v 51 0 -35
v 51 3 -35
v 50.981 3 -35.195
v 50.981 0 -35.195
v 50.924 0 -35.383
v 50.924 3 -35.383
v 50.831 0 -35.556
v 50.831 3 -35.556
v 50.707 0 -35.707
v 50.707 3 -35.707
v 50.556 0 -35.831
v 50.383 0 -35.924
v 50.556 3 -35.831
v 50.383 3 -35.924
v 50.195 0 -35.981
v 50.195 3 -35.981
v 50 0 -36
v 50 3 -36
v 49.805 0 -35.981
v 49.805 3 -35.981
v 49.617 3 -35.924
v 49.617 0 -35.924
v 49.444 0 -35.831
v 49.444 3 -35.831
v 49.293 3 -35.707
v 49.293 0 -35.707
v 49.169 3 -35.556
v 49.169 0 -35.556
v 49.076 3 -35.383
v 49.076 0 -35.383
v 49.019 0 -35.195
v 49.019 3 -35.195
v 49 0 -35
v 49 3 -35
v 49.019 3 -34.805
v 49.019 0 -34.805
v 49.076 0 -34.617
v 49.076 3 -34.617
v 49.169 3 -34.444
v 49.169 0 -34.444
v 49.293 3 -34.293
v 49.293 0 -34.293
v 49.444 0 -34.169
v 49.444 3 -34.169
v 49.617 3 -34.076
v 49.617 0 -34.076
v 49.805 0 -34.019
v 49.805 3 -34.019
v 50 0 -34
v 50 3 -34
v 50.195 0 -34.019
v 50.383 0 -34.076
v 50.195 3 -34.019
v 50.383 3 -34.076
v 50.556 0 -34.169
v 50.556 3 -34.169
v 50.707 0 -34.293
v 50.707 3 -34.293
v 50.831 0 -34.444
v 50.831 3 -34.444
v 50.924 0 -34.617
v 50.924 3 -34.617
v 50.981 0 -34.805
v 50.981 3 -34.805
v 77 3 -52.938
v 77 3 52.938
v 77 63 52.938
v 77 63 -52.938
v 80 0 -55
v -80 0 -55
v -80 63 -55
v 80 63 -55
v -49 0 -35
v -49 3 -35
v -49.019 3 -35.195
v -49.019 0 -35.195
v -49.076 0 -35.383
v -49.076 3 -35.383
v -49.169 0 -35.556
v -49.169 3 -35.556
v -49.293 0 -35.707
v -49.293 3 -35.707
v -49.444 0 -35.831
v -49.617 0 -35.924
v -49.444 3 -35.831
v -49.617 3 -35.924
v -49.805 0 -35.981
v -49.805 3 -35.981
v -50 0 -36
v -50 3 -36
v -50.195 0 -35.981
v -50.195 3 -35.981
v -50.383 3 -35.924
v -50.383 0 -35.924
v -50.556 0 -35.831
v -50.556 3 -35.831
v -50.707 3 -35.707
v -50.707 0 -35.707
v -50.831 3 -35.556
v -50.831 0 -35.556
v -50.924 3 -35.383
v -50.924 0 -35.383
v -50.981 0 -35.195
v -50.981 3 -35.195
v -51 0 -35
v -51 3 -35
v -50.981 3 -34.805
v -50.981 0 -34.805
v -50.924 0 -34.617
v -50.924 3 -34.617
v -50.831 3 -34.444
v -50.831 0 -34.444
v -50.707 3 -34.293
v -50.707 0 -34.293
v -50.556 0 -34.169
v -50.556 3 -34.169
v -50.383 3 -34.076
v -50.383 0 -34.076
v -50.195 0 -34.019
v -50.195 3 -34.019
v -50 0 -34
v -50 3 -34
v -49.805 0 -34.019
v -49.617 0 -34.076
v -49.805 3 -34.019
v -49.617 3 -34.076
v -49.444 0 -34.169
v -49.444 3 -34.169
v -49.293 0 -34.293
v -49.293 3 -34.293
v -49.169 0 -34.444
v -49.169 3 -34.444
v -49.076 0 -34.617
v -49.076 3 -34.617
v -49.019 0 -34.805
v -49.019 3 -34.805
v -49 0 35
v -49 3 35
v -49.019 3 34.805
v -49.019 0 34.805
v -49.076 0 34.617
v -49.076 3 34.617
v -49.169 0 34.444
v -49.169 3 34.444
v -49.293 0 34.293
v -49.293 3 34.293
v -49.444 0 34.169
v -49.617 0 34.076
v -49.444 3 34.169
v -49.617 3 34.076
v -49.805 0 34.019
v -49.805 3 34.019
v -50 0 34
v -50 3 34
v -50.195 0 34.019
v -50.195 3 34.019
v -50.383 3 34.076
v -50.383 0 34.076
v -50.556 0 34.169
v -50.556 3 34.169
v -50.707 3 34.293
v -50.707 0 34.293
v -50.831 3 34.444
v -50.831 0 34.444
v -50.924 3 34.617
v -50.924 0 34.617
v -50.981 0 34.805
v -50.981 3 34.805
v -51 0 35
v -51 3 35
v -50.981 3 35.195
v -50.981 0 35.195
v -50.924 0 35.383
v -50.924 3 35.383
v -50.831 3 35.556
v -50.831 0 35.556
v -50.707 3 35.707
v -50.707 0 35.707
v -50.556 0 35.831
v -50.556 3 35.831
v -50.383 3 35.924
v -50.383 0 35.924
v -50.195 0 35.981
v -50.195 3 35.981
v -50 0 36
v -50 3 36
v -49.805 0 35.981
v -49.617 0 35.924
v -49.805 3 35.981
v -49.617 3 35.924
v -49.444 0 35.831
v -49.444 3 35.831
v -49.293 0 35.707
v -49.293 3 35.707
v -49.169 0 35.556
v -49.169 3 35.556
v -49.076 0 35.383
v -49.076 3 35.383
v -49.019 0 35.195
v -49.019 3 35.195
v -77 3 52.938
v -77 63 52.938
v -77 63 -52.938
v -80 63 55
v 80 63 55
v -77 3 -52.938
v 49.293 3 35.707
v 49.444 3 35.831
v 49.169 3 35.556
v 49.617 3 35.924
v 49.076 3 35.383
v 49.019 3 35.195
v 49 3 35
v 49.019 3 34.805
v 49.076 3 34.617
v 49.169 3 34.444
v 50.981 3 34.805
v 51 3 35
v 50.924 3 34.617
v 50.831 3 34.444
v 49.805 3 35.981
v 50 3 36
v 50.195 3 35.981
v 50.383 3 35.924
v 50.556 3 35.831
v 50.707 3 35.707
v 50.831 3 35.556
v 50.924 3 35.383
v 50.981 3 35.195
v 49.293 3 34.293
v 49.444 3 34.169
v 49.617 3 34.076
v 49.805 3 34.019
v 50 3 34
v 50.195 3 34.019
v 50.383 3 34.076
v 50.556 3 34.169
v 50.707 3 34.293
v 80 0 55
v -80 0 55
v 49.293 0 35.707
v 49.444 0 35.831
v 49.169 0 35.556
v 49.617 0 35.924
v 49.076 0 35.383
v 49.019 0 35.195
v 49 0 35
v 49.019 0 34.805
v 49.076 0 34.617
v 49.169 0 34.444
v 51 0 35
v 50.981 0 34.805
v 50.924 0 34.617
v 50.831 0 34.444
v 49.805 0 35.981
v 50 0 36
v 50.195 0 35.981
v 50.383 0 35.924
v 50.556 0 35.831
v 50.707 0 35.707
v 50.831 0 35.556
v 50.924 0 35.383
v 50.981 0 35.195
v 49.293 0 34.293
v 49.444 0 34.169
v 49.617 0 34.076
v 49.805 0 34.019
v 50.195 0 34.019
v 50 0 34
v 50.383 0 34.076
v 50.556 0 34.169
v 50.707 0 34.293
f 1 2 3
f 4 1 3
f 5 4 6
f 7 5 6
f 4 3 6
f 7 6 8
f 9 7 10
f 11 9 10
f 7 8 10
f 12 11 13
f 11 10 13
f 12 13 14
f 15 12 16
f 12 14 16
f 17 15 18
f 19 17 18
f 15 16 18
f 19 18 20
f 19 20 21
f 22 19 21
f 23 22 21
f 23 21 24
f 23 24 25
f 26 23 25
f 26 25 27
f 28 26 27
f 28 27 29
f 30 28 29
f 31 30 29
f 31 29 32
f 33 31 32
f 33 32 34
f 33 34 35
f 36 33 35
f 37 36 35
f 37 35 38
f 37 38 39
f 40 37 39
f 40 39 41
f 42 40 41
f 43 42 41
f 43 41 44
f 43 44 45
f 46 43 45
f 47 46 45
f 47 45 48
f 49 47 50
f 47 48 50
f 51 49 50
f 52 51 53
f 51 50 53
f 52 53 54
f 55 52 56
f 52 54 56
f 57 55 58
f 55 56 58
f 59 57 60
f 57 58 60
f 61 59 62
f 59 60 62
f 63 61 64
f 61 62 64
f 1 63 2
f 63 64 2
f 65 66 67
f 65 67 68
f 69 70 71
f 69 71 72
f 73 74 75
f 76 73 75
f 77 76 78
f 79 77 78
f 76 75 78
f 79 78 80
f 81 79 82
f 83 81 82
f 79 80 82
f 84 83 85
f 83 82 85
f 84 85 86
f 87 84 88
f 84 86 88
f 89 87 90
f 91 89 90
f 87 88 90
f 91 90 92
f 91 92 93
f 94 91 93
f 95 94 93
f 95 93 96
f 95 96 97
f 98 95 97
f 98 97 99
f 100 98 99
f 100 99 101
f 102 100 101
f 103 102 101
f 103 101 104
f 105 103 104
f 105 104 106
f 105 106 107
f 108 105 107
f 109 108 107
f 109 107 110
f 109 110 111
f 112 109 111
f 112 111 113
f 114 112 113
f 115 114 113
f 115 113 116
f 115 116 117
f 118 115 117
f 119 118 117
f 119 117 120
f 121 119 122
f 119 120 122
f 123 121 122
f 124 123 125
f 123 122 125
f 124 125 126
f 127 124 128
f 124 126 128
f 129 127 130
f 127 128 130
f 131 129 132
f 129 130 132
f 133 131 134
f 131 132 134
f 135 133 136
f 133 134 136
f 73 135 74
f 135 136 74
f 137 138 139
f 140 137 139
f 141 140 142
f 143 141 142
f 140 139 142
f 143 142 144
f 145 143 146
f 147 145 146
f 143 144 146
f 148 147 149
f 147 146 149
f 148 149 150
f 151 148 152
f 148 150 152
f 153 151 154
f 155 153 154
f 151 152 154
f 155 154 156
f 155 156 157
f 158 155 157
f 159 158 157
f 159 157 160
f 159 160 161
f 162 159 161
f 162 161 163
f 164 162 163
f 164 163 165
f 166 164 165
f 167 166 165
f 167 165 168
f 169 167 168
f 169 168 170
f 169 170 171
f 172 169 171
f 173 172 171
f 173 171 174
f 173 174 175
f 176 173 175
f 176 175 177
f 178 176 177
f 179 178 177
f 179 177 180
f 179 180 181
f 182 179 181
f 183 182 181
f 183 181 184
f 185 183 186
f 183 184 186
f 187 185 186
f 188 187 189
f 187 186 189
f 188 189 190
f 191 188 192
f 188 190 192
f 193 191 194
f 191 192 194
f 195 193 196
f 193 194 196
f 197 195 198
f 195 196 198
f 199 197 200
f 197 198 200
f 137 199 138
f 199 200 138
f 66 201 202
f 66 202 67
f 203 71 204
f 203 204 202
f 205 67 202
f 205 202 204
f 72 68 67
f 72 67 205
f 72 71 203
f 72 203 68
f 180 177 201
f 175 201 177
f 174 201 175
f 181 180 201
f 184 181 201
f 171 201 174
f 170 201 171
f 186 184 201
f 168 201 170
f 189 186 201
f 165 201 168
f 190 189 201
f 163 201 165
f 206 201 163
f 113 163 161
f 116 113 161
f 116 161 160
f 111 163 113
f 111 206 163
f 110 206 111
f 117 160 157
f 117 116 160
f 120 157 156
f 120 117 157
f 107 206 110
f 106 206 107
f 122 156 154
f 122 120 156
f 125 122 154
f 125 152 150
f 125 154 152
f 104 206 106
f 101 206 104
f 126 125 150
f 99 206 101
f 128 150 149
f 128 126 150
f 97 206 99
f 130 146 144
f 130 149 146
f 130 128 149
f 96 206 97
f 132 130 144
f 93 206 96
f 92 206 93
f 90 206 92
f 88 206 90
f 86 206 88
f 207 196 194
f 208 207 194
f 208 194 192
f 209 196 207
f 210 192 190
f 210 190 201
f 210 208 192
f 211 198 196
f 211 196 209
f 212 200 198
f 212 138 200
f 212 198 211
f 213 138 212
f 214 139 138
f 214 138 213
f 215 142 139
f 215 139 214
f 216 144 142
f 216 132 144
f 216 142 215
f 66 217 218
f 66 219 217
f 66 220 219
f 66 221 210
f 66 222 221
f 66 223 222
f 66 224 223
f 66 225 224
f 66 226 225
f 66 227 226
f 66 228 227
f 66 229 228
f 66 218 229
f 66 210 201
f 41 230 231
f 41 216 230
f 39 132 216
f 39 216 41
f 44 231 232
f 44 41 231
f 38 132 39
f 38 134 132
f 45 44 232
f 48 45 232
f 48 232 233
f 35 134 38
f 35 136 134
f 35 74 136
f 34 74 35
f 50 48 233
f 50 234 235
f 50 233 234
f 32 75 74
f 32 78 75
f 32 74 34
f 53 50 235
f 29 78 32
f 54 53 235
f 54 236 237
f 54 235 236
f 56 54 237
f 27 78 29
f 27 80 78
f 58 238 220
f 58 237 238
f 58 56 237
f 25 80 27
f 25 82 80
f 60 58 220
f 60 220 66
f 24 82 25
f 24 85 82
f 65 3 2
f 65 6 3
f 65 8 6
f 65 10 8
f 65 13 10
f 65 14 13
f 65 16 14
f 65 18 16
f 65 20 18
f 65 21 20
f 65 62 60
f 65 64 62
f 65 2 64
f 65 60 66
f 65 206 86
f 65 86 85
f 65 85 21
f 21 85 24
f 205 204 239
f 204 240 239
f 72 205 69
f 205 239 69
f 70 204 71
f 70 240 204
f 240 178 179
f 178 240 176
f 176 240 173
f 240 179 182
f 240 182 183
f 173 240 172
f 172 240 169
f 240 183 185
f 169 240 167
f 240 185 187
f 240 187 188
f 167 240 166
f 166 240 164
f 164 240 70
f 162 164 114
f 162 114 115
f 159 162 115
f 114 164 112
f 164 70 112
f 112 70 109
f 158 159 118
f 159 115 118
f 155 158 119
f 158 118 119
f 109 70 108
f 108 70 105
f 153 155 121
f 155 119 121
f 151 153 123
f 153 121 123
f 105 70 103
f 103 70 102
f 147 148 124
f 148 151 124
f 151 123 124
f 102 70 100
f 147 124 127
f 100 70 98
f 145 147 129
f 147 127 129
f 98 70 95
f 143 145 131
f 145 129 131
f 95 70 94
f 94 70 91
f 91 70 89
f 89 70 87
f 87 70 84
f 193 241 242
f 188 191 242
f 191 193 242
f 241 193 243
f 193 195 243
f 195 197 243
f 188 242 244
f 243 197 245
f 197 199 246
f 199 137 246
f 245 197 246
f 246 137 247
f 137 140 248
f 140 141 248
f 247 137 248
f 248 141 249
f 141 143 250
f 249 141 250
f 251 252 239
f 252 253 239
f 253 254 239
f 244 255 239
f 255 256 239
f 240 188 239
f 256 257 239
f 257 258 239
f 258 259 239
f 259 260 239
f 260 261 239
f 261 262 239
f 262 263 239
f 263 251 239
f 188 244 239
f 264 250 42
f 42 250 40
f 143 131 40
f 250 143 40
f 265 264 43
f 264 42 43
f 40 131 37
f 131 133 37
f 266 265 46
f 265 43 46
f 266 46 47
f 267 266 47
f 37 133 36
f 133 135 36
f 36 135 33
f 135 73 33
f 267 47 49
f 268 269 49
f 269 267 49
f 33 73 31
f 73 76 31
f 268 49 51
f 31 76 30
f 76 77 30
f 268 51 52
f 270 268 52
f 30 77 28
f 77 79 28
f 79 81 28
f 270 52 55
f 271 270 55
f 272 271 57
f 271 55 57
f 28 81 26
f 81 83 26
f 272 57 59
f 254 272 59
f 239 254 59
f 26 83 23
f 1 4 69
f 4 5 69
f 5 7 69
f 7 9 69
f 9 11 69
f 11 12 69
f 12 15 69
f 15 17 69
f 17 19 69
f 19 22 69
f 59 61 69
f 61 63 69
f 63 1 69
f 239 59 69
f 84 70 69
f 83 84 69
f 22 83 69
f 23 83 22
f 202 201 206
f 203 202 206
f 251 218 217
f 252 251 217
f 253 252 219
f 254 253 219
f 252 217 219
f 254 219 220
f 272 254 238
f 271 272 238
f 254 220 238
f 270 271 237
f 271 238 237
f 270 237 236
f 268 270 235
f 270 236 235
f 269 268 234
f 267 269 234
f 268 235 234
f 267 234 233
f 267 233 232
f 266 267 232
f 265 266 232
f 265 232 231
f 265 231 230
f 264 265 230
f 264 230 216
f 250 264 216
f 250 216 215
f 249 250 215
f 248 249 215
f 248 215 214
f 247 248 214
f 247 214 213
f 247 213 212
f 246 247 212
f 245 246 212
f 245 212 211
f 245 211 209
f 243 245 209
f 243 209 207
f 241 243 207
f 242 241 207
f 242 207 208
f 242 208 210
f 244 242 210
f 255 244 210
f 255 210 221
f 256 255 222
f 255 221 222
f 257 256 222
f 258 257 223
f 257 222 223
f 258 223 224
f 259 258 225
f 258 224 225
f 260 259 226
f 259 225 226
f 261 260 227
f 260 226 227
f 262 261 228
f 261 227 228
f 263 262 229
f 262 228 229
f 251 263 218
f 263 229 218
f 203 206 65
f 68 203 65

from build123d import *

# Parameters (mm, degrees)
SKETCH_1_W          = 160
SKETCH_1_H          = 110
EXTRUDE_1_DEPTH     = 3
SKETCH_2_W          = 160
SKETCH_2_H          = 110
SKETCH_2_W_2        = 154
SKETCH_2_H_2        = 105.875
EXTRUDE_2_DEPTH     = 60
SKETCH_3_R          = 1
CUT_EXTRUDE_1_DEPTH = 10


with BuildPart() as part:
    # 草图1 → 凸台-拉伸1 (new body)
    with BuildSketch(Plane(origin=(0, 0, 0), x_dir=(1, 0, 0), z_dir=(0, 1, 0))):
        Rectangle(SKETCH_1_W, SKETCH_1_H)
    extrude(amount=EXTRUDE_1_DEPTH)

    # 草图2 → 凸台-拉伸2 (add)
    with BuildSketch(Plane(origin=(0, 3, 0), x_dir=(1, 0, 0), z_dir=(0, 1, 0))):
        Rectangle(SKETCH_2_W, SKETCH_2_H)
        Rectangle(SKETCH_2_W_2, SKETCH_2_H_2, mode=Mode.SUBTRACT)
    extrude(amount=EXTRUDE_2_DEPTH)

    # 草图3 → 切除-拉伸1 (cut)
    with BuildSketch(Plane(origin=(0, 3, 0), x_dir=(1, 0, 0), z_dir=(0, 1, 0))):
        with Locations((-50, 35)):
            Circle(SKETCH_3_R)
        with Locations((50, 35)):
            Circle(SKETCH_3_R)
        with Locations((50, -35)):
            Circle(SKETCH_3_R)
        with Locations((-50, -35)):
            Circle(SKETCH_3_R)
    extrude(amount=-CUT_EXTRUDE_1_DEPTH, mode=Mode.SUBTRACT)


solid = part.part
